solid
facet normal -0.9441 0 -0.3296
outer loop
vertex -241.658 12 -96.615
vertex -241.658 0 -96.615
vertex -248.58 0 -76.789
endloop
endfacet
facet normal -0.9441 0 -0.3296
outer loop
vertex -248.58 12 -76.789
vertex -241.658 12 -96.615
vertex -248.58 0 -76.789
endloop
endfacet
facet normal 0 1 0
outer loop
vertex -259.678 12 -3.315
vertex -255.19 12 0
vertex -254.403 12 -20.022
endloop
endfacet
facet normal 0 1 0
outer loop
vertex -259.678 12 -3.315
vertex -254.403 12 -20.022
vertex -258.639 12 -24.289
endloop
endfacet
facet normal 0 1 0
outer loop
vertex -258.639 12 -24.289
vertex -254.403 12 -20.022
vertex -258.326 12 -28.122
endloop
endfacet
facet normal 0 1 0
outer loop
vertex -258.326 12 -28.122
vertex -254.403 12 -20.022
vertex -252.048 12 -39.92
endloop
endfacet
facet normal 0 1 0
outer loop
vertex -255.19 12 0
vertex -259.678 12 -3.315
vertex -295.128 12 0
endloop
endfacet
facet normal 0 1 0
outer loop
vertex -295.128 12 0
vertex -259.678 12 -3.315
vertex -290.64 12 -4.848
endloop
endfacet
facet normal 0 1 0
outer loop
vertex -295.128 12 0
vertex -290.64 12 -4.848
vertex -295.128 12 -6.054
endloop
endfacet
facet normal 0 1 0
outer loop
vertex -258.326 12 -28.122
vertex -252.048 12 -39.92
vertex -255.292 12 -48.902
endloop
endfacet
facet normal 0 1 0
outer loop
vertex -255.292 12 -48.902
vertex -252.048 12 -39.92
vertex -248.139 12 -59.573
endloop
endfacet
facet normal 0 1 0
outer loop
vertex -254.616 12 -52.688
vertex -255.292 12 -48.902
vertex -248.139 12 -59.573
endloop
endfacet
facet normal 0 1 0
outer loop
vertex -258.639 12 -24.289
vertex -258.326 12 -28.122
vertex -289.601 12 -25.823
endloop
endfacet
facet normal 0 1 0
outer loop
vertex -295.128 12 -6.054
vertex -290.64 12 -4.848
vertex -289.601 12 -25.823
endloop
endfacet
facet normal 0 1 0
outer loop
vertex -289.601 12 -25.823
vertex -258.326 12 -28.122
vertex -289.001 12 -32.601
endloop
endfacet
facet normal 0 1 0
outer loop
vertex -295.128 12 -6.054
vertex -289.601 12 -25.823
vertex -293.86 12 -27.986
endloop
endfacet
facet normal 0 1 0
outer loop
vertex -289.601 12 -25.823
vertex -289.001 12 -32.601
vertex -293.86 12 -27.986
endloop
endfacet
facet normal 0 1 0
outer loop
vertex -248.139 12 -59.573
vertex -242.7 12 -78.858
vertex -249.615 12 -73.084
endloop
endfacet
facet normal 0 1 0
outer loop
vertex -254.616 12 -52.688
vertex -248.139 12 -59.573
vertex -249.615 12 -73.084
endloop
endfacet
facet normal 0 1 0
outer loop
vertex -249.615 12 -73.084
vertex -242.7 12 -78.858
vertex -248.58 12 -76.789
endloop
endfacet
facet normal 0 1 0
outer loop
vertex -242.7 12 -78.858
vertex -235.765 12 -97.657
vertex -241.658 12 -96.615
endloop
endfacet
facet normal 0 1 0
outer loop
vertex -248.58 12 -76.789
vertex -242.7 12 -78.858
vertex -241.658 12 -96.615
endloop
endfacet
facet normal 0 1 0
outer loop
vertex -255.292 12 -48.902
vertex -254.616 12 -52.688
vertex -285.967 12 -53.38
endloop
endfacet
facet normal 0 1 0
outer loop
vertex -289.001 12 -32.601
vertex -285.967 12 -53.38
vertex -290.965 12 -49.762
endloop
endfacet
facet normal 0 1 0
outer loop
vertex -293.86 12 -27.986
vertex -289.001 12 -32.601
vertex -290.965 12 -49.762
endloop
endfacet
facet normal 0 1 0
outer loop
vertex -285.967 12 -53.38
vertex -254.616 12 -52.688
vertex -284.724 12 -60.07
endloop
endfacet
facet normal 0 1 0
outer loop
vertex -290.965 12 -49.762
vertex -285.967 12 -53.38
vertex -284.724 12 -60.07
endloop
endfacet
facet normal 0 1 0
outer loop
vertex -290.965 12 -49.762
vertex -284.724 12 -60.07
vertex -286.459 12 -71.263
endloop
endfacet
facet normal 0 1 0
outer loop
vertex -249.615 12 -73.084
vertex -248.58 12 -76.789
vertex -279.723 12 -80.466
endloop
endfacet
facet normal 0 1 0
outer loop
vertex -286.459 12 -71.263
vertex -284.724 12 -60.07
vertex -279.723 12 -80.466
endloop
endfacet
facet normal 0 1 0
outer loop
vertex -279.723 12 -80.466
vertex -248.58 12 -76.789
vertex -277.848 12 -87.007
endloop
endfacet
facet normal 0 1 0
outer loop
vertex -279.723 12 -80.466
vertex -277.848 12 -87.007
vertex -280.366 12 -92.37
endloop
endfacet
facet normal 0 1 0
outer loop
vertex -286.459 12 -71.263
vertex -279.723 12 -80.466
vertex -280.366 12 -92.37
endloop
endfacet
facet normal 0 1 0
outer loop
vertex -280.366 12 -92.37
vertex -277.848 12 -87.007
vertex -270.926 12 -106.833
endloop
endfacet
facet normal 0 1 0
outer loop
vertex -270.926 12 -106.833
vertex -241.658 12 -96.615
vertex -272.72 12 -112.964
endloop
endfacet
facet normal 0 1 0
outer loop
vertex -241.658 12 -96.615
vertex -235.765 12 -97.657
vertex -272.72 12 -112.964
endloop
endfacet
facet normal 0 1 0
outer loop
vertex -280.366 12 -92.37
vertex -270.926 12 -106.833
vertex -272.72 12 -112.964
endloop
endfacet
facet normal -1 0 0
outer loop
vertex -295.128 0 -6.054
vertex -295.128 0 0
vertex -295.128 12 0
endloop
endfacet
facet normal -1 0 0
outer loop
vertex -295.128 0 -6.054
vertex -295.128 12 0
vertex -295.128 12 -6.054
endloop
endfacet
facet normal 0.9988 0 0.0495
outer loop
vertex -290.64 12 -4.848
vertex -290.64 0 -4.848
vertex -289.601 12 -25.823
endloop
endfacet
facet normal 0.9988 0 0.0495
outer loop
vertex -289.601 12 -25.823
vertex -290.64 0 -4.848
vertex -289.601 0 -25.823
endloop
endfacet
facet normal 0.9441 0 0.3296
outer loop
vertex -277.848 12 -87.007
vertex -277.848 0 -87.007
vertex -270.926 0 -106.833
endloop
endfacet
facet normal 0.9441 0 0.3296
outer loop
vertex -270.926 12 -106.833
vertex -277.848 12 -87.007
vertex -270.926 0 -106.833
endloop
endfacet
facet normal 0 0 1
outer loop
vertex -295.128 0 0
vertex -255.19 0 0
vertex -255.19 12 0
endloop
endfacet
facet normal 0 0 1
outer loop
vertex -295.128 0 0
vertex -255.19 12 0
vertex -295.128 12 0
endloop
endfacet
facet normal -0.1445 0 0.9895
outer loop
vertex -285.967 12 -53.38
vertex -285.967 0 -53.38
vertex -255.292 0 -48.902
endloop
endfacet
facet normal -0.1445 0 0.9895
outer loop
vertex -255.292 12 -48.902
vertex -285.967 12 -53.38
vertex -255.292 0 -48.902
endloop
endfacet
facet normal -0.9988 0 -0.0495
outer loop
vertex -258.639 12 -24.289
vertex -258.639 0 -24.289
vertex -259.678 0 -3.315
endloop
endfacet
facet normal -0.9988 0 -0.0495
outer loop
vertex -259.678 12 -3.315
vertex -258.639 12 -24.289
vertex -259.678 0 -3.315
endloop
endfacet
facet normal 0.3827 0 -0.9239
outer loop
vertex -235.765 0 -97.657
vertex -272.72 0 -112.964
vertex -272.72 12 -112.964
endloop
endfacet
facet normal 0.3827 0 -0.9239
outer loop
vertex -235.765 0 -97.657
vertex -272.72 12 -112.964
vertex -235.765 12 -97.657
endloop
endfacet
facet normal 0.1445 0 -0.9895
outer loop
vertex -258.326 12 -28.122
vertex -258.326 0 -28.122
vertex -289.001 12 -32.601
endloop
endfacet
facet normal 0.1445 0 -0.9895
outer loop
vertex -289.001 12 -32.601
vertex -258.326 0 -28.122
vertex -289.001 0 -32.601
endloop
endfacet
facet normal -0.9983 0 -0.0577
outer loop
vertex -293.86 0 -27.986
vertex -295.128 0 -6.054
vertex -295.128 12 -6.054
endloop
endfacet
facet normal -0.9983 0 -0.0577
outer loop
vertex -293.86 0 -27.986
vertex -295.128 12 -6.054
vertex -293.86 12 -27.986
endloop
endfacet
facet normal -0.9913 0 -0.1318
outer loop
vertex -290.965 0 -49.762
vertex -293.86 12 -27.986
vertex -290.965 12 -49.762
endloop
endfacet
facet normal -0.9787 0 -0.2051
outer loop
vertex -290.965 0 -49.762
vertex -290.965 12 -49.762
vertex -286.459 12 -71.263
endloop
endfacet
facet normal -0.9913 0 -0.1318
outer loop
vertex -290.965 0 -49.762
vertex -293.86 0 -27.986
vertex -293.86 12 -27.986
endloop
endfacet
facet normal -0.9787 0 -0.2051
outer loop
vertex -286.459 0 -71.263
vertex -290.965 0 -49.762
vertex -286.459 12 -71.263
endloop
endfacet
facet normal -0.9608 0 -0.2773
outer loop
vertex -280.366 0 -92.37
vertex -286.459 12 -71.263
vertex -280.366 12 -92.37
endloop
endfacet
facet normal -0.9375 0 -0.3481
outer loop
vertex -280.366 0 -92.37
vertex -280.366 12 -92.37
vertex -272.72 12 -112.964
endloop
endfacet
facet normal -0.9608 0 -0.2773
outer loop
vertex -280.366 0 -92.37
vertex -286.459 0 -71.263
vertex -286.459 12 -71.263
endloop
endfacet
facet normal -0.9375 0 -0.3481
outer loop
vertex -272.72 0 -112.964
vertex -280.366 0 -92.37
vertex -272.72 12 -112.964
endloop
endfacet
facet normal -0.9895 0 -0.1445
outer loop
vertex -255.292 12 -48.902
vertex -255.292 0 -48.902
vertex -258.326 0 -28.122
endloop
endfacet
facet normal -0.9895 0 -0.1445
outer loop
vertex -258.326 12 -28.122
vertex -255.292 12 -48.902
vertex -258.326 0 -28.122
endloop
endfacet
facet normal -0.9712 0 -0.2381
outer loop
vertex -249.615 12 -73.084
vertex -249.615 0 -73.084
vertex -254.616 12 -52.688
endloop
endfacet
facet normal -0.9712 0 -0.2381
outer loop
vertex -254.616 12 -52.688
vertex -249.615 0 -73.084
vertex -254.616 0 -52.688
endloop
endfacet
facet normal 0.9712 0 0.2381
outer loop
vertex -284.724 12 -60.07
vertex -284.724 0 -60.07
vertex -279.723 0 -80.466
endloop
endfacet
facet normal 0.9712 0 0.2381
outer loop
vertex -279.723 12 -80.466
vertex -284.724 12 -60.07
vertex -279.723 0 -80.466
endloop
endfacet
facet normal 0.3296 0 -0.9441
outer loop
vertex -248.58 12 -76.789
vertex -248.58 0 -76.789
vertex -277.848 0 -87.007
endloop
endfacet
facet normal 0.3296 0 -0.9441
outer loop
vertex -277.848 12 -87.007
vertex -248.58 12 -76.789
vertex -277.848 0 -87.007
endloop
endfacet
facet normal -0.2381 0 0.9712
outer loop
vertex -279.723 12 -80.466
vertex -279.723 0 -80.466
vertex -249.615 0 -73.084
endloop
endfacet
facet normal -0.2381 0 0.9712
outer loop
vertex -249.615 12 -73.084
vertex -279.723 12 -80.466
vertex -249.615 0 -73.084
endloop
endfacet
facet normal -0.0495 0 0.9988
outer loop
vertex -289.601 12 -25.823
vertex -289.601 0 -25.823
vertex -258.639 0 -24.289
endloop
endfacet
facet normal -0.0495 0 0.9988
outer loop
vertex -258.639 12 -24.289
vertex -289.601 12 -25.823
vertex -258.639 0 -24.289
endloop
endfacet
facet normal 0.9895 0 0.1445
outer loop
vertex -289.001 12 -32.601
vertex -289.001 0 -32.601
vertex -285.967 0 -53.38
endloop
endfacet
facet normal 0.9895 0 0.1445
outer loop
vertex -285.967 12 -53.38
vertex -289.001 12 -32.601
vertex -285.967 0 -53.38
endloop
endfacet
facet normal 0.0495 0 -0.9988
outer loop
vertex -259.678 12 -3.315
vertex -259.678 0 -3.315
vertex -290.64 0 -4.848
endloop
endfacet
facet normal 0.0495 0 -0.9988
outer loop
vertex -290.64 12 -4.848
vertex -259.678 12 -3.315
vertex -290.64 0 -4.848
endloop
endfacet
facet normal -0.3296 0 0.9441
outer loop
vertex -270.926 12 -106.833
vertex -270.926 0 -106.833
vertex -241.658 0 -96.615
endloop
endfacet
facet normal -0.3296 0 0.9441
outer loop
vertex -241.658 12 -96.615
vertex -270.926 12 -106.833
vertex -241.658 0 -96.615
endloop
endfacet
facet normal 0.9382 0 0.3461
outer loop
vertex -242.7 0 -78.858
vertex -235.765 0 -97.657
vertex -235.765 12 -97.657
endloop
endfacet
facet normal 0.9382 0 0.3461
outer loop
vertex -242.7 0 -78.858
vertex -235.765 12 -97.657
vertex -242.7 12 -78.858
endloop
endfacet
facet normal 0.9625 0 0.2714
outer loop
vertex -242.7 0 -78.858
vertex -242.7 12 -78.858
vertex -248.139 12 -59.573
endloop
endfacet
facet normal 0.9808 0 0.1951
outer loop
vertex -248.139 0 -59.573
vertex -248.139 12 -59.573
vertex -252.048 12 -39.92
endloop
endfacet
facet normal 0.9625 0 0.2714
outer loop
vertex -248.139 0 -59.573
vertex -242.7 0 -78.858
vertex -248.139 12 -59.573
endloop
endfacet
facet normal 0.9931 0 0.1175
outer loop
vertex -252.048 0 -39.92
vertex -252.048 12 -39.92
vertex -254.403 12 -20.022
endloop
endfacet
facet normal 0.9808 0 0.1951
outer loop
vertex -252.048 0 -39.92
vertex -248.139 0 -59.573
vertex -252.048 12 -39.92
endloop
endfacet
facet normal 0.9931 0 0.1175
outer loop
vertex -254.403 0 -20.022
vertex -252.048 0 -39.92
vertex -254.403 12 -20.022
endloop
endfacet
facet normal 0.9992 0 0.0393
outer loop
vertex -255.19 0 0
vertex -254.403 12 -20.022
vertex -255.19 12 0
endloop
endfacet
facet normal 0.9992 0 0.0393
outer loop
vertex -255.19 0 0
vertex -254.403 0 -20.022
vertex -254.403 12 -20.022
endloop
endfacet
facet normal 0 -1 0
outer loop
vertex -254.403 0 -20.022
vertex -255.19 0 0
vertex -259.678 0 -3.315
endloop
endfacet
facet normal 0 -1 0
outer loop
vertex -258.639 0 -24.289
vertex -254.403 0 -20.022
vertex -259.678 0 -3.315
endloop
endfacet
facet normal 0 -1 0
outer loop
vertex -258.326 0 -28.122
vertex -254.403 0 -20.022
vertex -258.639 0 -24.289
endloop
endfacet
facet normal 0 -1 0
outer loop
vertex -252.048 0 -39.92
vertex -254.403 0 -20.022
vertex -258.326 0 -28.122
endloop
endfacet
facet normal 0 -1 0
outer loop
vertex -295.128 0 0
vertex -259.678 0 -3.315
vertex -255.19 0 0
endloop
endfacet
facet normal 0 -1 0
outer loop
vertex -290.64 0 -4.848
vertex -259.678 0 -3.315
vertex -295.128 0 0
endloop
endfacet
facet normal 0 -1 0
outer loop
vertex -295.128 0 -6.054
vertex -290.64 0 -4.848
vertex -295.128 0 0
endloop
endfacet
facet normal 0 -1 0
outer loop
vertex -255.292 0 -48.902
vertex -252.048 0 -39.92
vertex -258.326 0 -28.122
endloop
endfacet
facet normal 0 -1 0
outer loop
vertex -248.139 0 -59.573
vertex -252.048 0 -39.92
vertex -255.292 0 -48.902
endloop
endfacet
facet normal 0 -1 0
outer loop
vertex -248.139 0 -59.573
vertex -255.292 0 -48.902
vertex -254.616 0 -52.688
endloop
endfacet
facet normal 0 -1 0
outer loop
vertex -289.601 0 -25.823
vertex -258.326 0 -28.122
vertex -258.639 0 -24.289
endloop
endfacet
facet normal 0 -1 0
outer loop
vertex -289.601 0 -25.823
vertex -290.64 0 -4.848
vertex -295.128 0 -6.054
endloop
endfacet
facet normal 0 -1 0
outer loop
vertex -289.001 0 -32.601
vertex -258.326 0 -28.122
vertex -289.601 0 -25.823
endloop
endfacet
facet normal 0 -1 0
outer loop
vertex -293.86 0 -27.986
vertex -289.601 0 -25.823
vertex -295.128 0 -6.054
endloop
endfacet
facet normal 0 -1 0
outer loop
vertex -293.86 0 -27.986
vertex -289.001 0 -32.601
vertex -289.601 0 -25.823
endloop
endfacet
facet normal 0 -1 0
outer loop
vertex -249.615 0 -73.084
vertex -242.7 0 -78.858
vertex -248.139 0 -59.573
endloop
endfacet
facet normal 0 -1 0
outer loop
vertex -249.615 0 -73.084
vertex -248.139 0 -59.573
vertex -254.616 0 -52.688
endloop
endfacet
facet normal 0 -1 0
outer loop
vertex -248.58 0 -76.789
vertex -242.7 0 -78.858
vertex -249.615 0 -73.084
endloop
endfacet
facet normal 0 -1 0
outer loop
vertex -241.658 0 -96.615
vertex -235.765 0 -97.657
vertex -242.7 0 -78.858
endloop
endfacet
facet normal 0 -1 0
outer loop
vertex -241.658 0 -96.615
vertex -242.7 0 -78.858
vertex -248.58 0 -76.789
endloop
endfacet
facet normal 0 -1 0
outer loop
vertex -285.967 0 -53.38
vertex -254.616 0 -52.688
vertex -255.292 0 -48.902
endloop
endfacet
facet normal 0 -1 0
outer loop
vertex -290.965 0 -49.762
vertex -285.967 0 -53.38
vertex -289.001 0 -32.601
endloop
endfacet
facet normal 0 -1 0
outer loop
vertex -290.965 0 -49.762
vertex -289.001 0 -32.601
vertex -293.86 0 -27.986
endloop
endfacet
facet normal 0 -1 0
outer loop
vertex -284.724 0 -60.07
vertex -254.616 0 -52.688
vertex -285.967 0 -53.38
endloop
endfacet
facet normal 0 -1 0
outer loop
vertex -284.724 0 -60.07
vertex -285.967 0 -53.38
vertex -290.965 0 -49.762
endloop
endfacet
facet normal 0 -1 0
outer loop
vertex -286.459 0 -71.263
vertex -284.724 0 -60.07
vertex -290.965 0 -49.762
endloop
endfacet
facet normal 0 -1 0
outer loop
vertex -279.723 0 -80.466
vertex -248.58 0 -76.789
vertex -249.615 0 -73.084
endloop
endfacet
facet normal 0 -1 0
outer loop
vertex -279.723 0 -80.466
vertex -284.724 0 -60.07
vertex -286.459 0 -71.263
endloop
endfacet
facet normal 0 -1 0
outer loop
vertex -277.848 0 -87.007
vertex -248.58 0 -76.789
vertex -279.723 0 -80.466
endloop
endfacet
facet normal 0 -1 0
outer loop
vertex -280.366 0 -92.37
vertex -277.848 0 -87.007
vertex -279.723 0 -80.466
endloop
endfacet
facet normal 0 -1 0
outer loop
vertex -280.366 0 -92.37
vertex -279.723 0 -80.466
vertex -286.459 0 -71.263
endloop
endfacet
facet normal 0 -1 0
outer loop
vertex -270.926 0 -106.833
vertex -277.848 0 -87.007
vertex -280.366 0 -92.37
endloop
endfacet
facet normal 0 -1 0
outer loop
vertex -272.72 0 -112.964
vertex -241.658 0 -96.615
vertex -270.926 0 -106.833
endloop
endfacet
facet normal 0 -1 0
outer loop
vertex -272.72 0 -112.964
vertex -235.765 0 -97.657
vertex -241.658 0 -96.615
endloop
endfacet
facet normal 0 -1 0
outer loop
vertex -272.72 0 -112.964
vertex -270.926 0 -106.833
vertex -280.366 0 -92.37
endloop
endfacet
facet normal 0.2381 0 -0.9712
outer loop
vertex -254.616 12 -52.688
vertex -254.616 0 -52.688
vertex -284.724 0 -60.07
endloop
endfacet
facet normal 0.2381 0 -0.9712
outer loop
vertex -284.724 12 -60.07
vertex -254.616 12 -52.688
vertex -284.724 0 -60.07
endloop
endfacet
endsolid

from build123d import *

# Parameters (mm, degrees)
BOSS_EXTRUDE1_DEPTH = 12


with BuildPart() as part:
    # Sketch1 → Boss-Extrude1 (new body)
    with BuildSketch(Plane(origin=(0, 0, 0), x_dir=(1, 0, 0), z_dir=(0, 1, 0))):
        with BuildLine():
            Line((-272.719864834, 112.964266743), (-235.764662876, 97.656920891))
            ThreePointArc((-235.764662876, 97.656920891), (-250.286431131, 49.785066539), (-255.189832201, 0))
            Line((-255.189832201, 0), (-295.127762341, 0))
            Line((-295.127762341, 0), (-295.127762341, 6.054265565))
            ThreePointArc((-295.127762341, 6.054265565), (-288.912043726, 60.55477872), (-272.719864834, 112.964266743))
        make_face()
        Polygon((-249.614999445, 73.084292156), (-254.615566779, 52.688353189), (-284.723857635, 60.070143062), (-279.723290301, 80.466082029), align=None, mode=Mode.SUBTRACT)
        Polygon((-241.658318908, 96.615135023), (-248.580348619, 76.788750968), (-277.847867938, 87.006985303), (-270.925838227, 106.833369358), align=None, mode=Mode.SUBTRACT)
        Polygon((-255.292380187, 48.902135943), (-258.325942442, 28.122398215), (-289.000793374, 32.600513925), (-285.967231118, 53.380251653), align=None, mode=Mode.SUBTRACT)
        Polygon((-258.638754349, 24.288905534), (-259.677683338, 3.314620647), (-290.639722934, 4.848277725), (-289.600793945, 25.822562613), align=None, mode=Mode.SUBTRACT)
    extrude(amount=BOSS_EXTRUDE1_DEPTH)


solid = part.part
